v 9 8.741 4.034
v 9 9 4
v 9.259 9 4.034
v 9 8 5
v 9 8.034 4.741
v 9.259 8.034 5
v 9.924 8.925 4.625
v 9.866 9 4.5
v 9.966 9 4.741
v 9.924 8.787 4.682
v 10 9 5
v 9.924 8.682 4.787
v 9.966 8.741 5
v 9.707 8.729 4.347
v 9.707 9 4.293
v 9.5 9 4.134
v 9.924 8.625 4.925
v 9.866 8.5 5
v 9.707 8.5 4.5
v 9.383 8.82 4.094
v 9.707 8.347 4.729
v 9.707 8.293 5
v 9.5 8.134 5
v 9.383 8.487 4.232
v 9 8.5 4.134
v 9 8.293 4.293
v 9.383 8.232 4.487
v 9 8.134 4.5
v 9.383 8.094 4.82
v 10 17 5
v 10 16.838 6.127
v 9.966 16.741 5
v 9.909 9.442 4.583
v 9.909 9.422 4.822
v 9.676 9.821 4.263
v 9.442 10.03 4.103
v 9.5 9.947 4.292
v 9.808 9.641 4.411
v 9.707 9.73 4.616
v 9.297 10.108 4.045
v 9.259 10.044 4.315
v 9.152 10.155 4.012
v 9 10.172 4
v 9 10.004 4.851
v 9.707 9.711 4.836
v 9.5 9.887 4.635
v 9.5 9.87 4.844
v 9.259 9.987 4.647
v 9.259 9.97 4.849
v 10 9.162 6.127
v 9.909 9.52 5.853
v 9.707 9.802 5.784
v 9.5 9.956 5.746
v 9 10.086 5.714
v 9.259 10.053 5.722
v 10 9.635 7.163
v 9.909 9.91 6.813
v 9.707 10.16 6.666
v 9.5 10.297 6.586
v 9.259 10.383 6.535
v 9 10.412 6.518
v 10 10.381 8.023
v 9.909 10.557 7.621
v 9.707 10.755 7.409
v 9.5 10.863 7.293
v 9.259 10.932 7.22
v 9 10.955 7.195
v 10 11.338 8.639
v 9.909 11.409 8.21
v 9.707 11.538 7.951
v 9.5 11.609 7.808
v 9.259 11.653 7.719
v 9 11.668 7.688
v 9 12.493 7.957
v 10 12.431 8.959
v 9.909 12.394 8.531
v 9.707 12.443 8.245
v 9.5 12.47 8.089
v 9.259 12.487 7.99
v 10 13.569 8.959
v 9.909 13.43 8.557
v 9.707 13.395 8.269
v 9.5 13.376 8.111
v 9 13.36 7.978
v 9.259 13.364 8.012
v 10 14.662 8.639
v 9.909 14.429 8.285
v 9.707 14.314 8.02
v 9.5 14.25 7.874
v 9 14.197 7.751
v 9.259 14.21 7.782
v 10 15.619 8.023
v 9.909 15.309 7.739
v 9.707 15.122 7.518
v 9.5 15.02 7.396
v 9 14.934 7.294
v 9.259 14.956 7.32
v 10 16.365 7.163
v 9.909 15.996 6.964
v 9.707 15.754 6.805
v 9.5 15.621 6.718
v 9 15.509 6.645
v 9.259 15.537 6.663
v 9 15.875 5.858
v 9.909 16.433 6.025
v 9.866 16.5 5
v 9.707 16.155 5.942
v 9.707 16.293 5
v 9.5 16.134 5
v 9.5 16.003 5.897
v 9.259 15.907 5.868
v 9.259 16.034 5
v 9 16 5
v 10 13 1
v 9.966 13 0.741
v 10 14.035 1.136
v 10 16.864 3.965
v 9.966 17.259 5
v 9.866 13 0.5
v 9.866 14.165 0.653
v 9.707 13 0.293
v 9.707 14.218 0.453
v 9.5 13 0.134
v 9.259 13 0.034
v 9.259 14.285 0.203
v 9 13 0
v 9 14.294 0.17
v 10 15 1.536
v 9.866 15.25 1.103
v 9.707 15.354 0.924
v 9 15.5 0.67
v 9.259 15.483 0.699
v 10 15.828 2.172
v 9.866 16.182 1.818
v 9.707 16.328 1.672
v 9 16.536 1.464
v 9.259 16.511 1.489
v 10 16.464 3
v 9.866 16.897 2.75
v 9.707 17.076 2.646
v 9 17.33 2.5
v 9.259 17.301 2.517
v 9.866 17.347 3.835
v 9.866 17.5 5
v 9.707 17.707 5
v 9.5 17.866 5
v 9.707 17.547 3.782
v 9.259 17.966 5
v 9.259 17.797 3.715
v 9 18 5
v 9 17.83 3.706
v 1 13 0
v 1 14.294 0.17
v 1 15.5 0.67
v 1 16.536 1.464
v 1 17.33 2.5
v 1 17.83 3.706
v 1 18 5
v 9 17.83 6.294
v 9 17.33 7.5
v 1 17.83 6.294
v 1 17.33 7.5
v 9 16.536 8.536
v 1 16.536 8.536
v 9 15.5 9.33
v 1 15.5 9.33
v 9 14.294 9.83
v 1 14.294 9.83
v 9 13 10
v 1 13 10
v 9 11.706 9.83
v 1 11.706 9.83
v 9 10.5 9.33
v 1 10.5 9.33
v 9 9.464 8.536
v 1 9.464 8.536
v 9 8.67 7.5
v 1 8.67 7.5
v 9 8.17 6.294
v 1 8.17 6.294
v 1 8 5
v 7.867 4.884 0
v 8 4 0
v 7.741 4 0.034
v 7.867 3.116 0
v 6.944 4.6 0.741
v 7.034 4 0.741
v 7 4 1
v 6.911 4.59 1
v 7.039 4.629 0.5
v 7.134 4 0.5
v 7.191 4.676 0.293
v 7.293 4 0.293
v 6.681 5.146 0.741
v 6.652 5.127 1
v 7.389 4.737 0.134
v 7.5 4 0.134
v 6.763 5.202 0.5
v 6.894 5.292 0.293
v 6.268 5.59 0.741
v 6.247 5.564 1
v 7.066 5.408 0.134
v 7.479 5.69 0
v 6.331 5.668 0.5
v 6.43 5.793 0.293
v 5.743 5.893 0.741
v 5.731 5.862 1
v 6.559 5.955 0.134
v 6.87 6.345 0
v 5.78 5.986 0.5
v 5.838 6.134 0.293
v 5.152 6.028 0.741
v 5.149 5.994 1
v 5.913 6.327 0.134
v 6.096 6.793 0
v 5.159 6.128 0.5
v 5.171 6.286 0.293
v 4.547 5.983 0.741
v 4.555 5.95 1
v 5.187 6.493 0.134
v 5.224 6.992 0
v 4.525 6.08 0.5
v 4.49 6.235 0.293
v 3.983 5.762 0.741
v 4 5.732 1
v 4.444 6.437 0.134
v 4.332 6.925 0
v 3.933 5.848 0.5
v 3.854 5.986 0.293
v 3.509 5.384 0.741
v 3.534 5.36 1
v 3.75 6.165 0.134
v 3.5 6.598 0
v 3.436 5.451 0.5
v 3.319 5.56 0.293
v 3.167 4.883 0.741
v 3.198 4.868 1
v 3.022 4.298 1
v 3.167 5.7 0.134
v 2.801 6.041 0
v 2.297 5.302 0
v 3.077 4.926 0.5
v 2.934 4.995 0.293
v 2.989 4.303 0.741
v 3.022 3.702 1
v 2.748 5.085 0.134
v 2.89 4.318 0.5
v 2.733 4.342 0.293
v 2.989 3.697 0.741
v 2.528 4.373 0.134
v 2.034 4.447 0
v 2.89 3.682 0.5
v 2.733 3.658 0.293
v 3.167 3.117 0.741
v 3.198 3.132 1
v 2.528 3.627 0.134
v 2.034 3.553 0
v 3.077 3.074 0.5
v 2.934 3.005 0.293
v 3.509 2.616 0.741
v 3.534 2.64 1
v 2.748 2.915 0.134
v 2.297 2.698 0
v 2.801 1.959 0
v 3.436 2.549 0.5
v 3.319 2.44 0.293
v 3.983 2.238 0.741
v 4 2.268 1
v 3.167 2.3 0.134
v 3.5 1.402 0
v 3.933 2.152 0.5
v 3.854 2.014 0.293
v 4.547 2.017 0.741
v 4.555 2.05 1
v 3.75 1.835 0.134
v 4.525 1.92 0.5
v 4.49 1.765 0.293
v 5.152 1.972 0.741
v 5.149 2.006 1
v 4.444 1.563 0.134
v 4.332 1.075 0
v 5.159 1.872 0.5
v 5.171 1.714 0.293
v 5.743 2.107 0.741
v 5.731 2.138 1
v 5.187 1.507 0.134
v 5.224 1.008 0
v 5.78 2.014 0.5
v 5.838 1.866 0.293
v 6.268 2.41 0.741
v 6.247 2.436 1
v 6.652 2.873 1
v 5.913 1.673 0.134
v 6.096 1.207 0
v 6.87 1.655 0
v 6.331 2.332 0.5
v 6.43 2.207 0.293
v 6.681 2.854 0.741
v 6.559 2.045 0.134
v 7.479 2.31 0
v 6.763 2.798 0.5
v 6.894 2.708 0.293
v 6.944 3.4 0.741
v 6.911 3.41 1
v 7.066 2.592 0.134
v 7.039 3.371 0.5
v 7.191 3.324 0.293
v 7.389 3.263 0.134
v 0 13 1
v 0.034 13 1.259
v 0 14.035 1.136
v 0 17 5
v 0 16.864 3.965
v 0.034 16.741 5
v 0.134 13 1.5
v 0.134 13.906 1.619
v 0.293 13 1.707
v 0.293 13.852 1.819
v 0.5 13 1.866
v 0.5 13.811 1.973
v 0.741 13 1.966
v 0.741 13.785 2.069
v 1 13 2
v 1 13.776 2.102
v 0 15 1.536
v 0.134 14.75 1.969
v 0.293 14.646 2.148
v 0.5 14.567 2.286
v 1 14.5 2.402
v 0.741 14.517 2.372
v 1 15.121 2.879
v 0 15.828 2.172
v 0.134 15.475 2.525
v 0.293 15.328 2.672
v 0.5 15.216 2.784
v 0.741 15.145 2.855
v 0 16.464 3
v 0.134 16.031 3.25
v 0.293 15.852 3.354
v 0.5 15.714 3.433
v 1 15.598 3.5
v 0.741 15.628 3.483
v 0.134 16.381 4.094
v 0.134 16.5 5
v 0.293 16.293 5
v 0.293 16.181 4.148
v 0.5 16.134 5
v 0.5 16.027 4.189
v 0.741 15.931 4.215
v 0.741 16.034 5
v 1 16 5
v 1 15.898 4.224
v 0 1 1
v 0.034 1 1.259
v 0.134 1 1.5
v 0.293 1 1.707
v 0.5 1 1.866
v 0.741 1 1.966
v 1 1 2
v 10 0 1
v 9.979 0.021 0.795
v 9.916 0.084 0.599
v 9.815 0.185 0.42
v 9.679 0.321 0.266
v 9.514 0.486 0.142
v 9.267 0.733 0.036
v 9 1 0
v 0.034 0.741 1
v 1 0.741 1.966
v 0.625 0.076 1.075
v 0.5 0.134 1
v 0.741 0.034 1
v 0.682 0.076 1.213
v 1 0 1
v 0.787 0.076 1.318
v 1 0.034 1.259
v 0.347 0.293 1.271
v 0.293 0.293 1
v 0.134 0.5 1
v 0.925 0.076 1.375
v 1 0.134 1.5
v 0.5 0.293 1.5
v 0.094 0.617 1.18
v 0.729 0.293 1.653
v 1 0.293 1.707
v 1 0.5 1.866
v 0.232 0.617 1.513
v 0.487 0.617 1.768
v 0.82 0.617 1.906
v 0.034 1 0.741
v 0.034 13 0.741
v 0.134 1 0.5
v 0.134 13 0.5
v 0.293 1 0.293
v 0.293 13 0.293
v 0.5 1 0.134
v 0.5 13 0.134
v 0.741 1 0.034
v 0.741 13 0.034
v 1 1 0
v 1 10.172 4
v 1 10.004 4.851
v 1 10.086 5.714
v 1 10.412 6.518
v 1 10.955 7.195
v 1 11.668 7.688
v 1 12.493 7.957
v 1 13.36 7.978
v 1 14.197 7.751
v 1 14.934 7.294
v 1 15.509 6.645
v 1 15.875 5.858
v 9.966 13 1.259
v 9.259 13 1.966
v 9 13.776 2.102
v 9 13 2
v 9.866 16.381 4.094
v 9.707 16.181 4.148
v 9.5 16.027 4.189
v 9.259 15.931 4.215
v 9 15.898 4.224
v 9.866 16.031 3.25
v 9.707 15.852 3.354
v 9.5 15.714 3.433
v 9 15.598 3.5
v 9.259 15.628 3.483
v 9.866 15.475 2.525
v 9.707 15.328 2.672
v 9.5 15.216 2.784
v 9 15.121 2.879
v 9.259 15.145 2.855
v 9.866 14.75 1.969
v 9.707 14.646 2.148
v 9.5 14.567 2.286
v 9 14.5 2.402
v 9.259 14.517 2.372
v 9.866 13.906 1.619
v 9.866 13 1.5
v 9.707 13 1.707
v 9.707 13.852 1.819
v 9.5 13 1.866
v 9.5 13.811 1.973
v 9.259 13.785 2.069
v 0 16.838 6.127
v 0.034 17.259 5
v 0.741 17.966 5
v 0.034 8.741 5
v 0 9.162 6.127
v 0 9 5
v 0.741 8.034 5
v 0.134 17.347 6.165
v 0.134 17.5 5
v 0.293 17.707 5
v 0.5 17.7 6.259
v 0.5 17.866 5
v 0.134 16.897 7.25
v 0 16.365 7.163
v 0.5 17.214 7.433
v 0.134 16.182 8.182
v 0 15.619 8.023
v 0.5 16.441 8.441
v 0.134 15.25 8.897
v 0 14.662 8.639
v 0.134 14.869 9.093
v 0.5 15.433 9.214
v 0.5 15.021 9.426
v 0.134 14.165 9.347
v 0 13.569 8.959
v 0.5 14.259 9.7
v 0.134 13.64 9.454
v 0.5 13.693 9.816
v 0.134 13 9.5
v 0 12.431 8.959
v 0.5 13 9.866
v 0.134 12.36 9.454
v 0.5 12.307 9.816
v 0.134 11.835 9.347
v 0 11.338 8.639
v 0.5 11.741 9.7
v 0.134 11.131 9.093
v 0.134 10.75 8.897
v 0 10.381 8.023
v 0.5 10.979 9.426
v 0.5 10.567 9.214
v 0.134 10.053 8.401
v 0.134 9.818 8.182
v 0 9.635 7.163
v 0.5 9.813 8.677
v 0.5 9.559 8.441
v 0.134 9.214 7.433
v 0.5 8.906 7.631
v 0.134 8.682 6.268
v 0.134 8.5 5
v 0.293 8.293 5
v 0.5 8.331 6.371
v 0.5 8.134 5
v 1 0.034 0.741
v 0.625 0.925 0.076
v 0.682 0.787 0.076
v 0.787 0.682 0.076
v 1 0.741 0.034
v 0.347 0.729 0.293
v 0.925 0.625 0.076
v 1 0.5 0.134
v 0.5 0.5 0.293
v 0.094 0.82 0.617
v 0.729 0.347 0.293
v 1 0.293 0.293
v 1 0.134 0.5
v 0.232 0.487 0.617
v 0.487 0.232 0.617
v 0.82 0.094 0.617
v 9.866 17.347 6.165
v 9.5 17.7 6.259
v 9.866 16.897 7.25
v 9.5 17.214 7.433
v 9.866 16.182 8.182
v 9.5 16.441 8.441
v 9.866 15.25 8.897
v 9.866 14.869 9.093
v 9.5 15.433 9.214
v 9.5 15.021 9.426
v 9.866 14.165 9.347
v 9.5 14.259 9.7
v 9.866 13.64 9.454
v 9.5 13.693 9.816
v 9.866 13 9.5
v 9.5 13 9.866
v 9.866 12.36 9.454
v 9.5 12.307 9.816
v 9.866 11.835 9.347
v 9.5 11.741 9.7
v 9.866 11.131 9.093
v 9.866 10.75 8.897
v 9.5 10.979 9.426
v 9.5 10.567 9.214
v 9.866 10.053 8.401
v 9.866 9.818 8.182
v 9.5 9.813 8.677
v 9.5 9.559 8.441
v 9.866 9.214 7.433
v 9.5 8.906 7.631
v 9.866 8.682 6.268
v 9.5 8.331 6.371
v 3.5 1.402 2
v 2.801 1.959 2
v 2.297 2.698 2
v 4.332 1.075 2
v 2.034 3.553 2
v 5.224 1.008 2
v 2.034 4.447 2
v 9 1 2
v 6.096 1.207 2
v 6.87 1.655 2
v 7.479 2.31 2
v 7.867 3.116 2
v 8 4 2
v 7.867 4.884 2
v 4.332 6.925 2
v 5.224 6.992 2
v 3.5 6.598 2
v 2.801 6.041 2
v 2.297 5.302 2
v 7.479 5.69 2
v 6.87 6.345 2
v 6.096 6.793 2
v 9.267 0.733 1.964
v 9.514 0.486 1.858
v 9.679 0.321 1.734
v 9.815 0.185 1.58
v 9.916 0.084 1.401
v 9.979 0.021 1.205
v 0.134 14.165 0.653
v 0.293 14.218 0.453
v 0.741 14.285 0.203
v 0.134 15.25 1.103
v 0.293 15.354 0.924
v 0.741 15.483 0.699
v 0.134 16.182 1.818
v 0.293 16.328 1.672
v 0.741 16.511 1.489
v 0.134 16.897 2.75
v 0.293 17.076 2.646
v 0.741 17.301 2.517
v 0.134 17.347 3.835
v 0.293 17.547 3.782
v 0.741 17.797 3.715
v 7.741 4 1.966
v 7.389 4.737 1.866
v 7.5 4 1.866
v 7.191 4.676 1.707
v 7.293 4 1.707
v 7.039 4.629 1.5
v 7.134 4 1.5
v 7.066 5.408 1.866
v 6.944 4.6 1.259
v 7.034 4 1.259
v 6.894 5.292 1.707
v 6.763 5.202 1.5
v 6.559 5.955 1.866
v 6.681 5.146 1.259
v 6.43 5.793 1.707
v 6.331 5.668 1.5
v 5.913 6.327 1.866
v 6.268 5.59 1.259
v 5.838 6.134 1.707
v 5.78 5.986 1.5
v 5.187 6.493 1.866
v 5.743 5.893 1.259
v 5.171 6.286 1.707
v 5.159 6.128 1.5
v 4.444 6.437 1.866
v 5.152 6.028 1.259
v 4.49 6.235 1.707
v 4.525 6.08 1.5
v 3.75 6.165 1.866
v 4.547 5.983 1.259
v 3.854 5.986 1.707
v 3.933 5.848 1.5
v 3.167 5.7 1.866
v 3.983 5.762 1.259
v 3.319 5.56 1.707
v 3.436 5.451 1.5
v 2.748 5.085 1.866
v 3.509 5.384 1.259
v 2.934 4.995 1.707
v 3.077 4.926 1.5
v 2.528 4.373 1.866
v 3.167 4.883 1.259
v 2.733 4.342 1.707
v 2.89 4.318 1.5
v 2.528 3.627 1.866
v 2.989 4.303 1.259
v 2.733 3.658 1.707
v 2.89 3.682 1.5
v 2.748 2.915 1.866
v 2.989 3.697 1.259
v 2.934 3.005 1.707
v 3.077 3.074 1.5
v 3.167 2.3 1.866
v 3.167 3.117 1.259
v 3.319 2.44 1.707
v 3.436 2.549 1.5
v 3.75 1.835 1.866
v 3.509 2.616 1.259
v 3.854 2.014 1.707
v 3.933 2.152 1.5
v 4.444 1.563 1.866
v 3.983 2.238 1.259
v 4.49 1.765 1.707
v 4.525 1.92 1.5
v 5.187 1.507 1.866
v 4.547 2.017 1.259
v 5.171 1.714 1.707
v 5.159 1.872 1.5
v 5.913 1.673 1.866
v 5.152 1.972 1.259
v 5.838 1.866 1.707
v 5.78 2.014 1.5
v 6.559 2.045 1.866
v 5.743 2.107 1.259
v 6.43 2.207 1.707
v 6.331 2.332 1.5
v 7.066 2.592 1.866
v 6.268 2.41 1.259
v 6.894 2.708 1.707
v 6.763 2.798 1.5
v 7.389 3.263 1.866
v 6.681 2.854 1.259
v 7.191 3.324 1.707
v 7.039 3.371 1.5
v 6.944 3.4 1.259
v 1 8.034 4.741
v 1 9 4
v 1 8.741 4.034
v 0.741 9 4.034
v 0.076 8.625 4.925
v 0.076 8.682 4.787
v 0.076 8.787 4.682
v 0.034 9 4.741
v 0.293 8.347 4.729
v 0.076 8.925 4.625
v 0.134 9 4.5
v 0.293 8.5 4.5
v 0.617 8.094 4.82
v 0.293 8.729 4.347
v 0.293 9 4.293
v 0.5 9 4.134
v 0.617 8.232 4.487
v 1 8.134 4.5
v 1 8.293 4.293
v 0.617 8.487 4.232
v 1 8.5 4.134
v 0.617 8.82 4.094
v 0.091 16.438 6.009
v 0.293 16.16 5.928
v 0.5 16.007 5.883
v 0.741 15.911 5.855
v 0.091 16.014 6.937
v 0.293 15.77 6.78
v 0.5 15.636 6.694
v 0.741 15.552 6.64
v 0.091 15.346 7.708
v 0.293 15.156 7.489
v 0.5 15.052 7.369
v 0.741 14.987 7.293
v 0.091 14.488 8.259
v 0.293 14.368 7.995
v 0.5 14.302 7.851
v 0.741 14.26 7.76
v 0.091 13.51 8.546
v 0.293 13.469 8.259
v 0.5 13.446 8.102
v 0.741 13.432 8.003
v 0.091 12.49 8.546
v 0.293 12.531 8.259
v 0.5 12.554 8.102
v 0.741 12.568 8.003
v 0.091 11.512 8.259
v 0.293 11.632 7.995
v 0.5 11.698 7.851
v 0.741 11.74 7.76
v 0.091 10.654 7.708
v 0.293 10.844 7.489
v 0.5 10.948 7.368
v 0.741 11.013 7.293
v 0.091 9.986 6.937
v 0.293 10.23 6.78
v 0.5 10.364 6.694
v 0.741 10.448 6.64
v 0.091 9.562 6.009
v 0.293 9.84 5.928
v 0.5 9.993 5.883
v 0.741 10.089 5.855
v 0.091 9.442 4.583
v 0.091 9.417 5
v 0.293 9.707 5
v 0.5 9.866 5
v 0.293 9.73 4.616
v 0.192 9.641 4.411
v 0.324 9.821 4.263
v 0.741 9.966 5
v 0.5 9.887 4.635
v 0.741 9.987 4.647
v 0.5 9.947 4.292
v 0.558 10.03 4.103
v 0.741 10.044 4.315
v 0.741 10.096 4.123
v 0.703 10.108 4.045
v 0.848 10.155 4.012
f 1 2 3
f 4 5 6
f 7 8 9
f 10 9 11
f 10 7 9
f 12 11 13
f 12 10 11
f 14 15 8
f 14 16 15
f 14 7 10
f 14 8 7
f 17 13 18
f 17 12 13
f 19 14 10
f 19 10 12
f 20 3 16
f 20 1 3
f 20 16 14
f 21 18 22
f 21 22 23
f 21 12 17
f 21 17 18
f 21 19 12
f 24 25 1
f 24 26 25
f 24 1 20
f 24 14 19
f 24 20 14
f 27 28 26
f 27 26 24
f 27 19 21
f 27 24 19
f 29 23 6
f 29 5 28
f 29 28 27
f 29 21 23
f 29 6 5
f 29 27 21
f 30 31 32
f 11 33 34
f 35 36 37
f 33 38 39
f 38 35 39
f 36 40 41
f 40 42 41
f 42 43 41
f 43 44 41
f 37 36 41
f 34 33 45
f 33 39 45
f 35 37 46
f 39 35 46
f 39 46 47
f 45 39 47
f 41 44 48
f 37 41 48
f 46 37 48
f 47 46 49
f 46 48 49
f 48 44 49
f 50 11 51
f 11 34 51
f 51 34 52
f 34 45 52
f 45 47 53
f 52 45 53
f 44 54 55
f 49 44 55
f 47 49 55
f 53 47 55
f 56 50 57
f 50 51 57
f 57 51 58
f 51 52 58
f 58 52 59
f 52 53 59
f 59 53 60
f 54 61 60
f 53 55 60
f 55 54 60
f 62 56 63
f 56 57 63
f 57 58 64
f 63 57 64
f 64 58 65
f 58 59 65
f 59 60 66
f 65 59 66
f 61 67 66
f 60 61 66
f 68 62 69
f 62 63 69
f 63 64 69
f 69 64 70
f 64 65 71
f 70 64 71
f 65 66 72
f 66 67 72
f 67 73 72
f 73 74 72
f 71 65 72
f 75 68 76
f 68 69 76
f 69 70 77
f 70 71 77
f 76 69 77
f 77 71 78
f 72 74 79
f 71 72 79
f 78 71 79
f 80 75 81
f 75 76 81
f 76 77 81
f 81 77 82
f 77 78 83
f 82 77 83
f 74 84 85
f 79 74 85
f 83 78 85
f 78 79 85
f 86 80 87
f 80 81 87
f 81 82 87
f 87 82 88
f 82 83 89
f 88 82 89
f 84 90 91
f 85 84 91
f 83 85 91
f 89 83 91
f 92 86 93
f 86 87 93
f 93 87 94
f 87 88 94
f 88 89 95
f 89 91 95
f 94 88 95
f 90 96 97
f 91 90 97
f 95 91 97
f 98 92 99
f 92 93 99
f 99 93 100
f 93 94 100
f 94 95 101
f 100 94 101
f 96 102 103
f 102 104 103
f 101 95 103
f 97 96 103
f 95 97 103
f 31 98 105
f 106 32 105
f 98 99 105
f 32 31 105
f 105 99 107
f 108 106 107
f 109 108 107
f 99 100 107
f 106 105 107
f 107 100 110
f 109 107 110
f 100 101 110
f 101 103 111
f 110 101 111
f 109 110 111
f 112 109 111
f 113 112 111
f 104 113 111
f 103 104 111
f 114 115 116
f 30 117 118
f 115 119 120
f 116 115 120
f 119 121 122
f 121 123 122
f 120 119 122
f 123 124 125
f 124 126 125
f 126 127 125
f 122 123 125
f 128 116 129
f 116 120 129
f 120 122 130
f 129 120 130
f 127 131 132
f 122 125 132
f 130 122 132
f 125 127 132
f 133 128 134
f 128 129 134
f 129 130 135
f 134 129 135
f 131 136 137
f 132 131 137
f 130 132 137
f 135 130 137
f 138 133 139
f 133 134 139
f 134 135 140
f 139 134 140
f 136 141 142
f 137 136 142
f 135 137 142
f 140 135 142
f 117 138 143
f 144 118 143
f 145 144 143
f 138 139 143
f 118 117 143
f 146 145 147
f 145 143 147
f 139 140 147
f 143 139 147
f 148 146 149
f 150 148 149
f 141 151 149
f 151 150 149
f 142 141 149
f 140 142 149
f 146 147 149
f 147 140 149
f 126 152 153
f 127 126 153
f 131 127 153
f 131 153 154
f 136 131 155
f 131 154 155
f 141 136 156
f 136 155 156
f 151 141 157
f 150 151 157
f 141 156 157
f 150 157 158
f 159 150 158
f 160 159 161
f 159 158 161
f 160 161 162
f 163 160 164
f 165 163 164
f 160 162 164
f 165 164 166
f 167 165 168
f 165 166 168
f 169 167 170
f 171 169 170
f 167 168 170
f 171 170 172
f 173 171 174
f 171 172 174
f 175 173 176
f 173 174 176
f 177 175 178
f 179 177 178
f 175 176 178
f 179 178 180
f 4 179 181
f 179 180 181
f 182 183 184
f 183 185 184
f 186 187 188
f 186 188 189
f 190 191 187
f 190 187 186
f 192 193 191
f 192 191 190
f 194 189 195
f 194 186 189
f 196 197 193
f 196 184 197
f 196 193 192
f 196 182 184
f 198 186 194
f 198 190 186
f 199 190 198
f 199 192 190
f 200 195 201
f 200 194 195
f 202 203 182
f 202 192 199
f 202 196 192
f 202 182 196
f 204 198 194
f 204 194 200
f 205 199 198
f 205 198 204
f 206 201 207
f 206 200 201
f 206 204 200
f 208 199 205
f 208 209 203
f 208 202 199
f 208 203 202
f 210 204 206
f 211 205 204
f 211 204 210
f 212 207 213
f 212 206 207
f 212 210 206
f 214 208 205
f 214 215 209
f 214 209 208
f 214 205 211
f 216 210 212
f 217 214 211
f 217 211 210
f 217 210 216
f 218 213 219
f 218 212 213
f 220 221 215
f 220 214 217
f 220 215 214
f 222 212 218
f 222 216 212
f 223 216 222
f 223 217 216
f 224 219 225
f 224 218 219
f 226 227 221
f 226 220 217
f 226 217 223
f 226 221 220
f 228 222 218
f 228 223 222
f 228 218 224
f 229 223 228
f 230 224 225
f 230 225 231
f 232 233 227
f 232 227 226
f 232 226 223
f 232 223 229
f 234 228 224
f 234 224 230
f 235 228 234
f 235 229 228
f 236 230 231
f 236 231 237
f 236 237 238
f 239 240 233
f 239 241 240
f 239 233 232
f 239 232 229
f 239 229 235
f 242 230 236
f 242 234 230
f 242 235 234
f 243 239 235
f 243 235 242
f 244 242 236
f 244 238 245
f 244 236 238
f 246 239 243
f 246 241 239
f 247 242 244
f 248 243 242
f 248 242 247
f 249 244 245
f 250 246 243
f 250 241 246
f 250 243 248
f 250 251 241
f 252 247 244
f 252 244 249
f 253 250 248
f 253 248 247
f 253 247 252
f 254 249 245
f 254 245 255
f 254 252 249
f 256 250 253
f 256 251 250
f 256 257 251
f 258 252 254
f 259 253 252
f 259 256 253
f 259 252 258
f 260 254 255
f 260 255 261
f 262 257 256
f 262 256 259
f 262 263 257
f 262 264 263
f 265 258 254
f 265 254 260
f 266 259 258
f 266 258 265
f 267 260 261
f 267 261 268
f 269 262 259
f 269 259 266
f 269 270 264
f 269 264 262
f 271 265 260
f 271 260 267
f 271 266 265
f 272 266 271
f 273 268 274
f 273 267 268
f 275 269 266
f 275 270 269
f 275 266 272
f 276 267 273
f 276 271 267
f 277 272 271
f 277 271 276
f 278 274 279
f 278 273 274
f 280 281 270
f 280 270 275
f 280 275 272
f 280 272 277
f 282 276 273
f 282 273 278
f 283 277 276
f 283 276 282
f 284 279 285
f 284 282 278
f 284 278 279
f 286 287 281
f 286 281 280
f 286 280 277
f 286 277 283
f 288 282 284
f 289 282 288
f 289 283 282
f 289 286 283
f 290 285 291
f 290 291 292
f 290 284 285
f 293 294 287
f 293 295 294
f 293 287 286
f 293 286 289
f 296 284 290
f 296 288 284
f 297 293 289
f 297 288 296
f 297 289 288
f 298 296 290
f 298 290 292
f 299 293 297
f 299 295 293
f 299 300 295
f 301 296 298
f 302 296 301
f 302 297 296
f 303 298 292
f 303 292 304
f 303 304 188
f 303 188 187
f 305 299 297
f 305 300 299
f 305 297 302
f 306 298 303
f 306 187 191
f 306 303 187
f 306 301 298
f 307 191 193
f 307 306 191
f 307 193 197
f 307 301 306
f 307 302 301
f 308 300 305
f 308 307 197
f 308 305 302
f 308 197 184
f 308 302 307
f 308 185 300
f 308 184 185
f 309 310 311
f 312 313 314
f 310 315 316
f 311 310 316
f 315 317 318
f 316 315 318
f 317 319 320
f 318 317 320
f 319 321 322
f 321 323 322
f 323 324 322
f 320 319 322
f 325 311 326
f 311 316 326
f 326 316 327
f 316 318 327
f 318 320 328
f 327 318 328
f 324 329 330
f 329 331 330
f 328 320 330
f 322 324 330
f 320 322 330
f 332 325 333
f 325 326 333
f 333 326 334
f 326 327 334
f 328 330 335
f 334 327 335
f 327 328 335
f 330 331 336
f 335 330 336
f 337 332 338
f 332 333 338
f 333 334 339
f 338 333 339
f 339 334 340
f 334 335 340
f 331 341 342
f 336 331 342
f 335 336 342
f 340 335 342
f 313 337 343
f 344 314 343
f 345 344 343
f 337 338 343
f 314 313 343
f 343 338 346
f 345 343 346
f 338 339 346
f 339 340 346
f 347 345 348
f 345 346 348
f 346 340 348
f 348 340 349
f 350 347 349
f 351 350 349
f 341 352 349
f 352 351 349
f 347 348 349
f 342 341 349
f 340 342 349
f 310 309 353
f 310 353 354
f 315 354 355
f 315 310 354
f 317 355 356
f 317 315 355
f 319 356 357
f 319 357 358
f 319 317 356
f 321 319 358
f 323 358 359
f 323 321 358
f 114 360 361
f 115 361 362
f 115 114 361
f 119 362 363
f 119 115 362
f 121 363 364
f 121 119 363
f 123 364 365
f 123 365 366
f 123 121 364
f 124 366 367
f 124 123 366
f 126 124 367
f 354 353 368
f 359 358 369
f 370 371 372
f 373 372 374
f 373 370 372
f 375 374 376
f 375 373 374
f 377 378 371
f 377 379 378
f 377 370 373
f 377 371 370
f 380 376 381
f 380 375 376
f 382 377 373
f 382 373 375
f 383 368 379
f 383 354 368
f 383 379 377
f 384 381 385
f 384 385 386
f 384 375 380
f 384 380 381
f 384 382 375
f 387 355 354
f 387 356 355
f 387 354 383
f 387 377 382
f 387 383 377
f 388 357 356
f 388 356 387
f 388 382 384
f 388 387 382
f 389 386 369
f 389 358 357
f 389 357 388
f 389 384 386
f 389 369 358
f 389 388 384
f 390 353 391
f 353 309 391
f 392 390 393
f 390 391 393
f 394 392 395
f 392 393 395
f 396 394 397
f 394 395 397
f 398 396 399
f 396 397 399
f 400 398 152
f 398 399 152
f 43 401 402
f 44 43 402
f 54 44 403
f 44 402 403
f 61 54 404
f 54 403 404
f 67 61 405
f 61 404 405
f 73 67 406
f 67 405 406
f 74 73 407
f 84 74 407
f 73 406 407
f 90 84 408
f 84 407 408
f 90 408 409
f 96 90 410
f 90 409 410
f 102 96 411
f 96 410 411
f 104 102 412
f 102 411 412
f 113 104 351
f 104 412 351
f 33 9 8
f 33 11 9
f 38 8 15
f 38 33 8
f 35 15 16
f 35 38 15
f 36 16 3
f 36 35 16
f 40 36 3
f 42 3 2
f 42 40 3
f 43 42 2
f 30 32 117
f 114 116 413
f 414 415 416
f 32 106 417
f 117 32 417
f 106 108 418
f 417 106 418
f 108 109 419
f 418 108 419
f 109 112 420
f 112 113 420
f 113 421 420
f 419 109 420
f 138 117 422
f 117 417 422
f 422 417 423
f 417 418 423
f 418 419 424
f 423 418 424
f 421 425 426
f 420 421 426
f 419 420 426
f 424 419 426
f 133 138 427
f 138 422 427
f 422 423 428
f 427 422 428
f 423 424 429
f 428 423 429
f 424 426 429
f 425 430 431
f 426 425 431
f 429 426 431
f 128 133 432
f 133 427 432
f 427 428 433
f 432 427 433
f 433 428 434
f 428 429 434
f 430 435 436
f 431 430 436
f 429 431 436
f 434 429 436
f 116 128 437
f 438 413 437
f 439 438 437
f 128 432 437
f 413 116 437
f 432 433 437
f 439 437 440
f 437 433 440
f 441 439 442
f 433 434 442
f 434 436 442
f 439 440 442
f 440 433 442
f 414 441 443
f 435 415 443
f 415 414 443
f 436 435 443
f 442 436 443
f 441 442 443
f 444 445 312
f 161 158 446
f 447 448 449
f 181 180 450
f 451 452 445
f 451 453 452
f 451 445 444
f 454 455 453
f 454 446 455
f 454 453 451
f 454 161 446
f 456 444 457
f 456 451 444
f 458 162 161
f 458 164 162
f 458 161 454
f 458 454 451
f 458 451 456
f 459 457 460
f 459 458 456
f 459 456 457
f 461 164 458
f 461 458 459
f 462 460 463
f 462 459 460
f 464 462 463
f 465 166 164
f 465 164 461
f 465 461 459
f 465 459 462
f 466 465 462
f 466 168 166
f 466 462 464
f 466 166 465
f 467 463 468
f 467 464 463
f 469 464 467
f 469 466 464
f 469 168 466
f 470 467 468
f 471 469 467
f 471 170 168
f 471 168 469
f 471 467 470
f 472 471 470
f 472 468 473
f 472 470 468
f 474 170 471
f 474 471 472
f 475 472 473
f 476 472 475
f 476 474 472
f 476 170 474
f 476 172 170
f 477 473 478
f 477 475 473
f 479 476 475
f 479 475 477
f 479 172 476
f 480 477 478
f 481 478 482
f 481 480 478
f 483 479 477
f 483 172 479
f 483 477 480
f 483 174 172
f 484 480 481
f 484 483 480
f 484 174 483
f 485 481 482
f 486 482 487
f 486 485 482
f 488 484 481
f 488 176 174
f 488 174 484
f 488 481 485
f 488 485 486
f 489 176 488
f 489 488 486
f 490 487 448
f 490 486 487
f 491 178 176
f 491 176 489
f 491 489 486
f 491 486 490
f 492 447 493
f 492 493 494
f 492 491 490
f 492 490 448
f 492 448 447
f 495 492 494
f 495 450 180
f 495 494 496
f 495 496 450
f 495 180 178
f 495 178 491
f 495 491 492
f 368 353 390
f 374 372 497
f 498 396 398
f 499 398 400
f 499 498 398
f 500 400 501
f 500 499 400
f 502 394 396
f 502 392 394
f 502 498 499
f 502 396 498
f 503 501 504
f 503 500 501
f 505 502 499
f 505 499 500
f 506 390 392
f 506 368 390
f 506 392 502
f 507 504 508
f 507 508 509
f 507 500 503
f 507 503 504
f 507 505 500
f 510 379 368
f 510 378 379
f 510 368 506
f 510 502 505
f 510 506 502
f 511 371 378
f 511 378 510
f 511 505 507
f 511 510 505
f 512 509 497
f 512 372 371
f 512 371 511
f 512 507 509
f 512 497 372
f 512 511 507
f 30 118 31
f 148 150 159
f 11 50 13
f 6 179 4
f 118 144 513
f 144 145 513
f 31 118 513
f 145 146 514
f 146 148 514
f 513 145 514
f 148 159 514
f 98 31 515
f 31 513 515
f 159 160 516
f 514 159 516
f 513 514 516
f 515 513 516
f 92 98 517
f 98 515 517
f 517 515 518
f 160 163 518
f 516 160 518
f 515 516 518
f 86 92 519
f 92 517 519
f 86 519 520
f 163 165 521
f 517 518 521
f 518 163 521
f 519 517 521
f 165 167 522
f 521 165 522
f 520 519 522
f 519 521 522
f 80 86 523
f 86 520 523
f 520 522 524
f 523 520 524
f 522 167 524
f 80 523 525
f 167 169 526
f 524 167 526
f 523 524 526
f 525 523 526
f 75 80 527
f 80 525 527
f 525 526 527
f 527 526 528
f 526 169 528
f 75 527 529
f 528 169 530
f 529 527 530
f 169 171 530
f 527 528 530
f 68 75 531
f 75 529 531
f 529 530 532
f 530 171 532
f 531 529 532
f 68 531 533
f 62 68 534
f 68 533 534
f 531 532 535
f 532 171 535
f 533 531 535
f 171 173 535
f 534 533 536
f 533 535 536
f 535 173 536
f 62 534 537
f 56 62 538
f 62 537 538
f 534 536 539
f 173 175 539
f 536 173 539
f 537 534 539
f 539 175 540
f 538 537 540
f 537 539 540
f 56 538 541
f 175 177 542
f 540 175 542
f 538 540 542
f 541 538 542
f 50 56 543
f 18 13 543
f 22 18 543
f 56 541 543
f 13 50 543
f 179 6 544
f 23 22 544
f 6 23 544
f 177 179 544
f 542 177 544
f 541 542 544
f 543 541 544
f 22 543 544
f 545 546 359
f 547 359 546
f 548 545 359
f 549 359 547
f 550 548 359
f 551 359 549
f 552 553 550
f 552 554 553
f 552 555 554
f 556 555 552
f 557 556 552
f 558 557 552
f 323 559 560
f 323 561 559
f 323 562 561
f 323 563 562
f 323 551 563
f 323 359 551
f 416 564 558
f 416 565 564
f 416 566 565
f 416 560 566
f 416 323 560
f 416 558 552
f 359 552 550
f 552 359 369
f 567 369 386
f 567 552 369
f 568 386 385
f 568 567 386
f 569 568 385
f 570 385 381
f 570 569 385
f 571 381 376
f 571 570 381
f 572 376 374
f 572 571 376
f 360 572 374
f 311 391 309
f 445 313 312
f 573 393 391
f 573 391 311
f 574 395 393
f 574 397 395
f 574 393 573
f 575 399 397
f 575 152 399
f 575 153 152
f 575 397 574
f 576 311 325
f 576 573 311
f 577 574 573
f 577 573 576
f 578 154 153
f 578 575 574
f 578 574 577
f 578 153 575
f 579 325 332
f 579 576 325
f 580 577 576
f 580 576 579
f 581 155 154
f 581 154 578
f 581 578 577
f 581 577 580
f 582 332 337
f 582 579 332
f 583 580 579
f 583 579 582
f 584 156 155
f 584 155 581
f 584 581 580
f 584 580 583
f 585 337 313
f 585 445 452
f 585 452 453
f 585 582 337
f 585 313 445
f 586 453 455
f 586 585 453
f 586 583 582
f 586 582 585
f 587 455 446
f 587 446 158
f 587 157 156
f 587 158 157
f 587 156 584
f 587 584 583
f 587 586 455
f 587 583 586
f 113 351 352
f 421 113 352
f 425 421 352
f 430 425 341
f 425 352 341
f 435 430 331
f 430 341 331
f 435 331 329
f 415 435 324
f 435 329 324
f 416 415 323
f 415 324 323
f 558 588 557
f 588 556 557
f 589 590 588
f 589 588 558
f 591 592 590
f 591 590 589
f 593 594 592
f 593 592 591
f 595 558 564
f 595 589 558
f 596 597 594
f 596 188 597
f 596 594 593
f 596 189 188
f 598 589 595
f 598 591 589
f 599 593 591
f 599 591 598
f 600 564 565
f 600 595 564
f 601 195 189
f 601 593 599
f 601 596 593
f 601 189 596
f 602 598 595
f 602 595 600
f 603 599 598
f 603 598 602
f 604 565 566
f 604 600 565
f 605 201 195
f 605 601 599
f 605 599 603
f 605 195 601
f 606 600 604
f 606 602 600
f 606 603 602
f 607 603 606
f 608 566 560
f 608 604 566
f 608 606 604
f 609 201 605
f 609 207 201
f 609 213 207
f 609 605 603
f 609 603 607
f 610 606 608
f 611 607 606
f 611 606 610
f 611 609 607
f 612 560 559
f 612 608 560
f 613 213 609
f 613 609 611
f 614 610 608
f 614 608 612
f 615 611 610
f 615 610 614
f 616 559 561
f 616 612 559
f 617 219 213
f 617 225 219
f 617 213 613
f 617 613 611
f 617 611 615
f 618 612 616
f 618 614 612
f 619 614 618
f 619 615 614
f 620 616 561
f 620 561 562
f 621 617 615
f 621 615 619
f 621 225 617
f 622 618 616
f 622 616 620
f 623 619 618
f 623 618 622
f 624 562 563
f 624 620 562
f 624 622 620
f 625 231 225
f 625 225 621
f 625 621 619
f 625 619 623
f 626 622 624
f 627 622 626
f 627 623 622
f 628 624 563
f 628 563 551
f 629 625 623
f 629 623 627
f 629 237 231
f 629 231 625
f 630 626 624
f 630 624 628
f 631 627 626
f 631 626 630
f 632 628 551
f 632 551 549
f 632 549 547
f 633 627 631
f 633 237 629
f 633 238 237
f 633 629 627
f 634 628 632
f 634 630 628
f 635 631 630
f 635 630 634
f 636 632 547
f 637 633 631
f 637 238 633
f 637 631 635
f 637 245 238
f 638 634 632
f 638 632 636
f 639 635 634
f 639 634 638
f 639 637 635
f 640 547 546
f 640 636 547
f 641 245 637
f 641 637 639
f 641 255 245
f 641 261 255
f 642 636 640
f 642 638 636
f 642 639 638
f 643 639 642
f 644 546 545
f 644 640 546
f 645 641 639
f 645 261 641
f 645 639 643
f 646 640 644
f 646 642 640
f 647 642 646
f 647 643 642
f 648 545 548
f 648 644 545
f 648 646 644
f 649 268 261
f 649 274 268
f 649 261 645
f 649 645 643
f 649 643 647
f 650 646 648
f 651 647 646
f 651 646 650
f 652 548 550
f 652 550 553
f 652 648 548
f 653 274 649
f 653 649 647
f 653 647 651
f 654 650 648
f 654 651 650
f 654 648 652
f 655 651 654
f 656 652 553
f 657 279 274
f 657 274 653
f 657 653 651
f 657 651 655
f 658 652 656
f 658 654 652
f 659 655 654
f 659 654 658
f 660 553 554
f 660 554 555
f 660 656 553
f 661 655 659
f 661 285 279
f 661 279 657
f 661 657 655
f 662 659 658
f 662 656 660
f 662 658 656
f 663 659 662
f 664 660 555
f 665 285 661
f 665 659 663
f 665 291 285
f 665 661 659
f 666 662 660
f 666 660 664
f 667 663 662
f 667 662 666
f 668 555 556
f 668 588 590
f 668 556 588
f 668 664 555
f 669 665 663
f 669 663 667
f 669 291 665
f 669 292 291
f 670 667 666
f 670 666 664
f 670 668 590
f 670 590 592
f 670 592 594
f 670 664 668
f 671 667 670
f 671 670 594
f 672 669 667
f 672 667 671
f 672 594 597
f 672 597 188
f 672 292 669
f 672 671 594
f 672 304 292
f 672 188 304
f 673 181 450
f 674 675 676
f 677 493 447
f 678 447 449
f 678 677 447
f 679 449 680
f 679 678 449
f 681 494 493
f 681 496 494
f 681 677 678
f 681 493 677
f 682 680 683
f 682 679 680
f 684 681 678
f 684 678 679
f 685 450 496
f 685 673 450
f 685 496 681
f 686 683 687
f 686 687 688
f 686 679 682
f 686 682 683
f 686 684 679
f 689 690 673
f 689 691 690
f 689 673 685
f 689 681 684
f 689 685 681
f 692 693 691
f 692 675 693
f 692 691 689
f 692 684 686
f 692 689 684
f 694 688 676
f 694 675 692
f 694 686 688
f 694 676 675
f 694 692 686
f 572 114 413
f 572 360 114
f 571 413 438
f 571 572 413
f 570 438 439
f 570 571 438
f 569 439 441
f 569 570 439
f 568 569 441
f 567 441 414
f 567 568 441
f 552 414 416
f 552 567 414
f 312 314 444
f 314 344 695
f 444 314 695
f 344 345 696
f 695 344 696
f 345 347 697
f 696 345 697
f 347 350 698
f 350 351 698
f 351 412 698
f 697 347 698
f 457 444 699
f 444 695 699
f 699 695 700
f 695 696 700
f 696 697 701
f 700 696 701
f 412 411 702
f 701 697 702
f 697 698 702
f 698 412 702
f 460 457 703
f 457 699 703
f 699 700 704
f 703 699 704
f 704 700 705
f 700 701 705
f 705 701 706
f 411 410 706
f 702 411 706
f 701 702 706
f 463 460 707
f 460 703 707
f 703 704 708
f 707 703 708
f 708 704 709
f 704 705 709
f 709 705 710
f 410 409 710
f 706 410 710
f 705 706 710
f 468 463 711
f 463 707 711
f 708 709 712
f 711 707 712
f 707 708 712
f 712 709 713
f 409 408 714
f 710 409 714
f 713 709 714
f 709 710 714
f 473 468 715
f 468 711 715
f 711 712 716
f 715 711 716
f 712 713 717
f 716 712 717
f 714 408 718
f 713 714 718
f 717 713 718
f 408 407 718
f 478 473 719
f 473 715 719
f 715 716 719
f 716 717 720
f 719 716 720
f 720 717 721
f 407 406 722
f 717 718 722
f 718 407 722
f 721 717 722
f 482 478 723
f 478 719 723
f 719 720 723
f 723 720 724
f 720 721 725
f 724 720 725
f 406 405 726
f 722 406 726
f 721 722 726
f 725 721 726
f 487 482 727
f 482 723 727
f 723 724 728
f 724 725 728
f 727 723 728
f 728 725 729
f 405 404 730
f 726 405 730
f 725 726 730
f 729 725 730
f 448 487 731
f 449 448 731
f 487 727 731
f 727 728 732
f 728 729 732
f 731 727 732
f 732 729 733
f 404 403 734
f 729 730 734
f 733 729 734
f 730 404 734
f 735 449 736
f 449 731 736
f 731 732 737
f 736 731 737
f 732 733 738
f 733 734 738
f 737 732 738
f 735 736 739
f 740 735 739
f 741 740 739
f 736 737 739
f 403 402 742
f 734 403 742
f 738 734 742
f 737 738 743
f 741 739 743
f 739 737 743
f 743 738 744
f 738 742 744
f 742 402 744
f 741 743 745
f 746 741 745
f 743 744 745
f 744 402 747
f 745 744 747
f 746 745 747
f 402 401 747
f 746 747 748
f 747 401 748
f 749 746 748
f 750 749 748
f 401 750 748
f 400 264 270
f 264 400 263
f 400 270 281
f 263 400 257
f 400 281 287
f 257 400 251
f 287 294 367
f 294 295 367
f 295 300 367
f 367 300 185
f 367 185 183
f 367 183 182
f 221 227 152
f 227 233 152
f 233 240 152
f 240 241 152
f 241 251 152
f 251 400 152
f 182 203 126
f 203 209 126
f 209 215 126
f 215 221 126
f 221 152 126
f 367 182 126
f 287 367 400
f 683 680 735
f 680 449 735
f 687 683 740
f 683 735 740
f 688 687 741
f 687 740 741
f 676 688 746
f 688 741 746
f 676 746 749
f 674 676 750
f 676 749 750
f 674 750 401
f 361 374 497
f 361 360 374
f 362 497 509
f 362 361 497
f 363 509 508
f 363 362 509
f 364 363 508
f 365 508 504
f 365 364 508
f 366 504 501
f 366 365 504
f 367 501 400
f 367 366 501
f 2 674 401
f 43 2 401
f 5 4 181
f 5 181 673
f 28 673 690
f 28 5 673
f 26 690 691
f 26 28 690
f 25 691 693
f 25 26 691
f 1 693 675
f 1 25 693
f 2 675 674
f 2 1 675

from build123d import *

# Parameters (mm, degrees)
F0_W     = 10
F0_H     = 13
F0_R     = 2
F1_DEPTH = 2
F3_DEPTH = 10
F4_R     = 0.99999


# Not quite as in the source:
# - a fillet or chamfer is up to 0.001 mm smaller than in the source, because OpenCascade refuses the exact size


with BuildPart() as f1:
    # F0 (on Top) → F1 (new body)
    with BuildSketch(Plane.XY):
        with Locations((5, 6.5)):
            Rectangle(F0_W, F0_H)
        with Locations((5, 4)):
            Circle(F0_R, mode=Mode.SUBTRACT)
    extrude(amount=F1_DEPTH)

    # F2 (on Right) → F3 (join)
    with BuildSketch(Plane.YZ):
        with BuildLine():
            ThreePointArc((9, 2), (14.5811388301, 0.2565835097), (18, 5))
            ThreePointArc((18, 5), (12.49745519, 9.974680765), (8.1010205144, 4))
            Line((8.1010205144, 4), (10.1715728753, 4))
            ThreePointArc((10.1715728753, 4), (12.4926940638, 7.956795679), (16, 5))
            ThreePointArc((16, 5), (15.1213203436, 2.8786796564), (13, 2))
            Line((13, 2), (9, 2))
        make_face()
    extrude(amount=F3_DEPTH)

    # F4 (radius 1 in the source; OpenCascade refuses exactly that, so slightly less here)
    f4_edges = [f1.edges().sort_by_distance(p)[0] for p in [
        (0, 6.5, 2),
        (0, 12.492694, 7.956796),
        (0, 0, 1),
        (0, 6.5, 0),
        (0, 16.162278, 8.872983),
        (0, 9.136297, 4),
        (0, 15.12132, 2.87868),
        (10, 12.492694, 7.956796),
        (10, 16.162278, 8.872983),
        (10, 6.5, 2),
        (10, 6.5, 0),
        (5, 8.101021, 4),
        (10, 9.136297, 4),
        (5, 0, 2),
        (5, 0, 0),
        (3, 4, 2),
        (3, 4, 0),
    ]]
    fillet(f4_edges, radius=F4_R)


solid = f1.part
